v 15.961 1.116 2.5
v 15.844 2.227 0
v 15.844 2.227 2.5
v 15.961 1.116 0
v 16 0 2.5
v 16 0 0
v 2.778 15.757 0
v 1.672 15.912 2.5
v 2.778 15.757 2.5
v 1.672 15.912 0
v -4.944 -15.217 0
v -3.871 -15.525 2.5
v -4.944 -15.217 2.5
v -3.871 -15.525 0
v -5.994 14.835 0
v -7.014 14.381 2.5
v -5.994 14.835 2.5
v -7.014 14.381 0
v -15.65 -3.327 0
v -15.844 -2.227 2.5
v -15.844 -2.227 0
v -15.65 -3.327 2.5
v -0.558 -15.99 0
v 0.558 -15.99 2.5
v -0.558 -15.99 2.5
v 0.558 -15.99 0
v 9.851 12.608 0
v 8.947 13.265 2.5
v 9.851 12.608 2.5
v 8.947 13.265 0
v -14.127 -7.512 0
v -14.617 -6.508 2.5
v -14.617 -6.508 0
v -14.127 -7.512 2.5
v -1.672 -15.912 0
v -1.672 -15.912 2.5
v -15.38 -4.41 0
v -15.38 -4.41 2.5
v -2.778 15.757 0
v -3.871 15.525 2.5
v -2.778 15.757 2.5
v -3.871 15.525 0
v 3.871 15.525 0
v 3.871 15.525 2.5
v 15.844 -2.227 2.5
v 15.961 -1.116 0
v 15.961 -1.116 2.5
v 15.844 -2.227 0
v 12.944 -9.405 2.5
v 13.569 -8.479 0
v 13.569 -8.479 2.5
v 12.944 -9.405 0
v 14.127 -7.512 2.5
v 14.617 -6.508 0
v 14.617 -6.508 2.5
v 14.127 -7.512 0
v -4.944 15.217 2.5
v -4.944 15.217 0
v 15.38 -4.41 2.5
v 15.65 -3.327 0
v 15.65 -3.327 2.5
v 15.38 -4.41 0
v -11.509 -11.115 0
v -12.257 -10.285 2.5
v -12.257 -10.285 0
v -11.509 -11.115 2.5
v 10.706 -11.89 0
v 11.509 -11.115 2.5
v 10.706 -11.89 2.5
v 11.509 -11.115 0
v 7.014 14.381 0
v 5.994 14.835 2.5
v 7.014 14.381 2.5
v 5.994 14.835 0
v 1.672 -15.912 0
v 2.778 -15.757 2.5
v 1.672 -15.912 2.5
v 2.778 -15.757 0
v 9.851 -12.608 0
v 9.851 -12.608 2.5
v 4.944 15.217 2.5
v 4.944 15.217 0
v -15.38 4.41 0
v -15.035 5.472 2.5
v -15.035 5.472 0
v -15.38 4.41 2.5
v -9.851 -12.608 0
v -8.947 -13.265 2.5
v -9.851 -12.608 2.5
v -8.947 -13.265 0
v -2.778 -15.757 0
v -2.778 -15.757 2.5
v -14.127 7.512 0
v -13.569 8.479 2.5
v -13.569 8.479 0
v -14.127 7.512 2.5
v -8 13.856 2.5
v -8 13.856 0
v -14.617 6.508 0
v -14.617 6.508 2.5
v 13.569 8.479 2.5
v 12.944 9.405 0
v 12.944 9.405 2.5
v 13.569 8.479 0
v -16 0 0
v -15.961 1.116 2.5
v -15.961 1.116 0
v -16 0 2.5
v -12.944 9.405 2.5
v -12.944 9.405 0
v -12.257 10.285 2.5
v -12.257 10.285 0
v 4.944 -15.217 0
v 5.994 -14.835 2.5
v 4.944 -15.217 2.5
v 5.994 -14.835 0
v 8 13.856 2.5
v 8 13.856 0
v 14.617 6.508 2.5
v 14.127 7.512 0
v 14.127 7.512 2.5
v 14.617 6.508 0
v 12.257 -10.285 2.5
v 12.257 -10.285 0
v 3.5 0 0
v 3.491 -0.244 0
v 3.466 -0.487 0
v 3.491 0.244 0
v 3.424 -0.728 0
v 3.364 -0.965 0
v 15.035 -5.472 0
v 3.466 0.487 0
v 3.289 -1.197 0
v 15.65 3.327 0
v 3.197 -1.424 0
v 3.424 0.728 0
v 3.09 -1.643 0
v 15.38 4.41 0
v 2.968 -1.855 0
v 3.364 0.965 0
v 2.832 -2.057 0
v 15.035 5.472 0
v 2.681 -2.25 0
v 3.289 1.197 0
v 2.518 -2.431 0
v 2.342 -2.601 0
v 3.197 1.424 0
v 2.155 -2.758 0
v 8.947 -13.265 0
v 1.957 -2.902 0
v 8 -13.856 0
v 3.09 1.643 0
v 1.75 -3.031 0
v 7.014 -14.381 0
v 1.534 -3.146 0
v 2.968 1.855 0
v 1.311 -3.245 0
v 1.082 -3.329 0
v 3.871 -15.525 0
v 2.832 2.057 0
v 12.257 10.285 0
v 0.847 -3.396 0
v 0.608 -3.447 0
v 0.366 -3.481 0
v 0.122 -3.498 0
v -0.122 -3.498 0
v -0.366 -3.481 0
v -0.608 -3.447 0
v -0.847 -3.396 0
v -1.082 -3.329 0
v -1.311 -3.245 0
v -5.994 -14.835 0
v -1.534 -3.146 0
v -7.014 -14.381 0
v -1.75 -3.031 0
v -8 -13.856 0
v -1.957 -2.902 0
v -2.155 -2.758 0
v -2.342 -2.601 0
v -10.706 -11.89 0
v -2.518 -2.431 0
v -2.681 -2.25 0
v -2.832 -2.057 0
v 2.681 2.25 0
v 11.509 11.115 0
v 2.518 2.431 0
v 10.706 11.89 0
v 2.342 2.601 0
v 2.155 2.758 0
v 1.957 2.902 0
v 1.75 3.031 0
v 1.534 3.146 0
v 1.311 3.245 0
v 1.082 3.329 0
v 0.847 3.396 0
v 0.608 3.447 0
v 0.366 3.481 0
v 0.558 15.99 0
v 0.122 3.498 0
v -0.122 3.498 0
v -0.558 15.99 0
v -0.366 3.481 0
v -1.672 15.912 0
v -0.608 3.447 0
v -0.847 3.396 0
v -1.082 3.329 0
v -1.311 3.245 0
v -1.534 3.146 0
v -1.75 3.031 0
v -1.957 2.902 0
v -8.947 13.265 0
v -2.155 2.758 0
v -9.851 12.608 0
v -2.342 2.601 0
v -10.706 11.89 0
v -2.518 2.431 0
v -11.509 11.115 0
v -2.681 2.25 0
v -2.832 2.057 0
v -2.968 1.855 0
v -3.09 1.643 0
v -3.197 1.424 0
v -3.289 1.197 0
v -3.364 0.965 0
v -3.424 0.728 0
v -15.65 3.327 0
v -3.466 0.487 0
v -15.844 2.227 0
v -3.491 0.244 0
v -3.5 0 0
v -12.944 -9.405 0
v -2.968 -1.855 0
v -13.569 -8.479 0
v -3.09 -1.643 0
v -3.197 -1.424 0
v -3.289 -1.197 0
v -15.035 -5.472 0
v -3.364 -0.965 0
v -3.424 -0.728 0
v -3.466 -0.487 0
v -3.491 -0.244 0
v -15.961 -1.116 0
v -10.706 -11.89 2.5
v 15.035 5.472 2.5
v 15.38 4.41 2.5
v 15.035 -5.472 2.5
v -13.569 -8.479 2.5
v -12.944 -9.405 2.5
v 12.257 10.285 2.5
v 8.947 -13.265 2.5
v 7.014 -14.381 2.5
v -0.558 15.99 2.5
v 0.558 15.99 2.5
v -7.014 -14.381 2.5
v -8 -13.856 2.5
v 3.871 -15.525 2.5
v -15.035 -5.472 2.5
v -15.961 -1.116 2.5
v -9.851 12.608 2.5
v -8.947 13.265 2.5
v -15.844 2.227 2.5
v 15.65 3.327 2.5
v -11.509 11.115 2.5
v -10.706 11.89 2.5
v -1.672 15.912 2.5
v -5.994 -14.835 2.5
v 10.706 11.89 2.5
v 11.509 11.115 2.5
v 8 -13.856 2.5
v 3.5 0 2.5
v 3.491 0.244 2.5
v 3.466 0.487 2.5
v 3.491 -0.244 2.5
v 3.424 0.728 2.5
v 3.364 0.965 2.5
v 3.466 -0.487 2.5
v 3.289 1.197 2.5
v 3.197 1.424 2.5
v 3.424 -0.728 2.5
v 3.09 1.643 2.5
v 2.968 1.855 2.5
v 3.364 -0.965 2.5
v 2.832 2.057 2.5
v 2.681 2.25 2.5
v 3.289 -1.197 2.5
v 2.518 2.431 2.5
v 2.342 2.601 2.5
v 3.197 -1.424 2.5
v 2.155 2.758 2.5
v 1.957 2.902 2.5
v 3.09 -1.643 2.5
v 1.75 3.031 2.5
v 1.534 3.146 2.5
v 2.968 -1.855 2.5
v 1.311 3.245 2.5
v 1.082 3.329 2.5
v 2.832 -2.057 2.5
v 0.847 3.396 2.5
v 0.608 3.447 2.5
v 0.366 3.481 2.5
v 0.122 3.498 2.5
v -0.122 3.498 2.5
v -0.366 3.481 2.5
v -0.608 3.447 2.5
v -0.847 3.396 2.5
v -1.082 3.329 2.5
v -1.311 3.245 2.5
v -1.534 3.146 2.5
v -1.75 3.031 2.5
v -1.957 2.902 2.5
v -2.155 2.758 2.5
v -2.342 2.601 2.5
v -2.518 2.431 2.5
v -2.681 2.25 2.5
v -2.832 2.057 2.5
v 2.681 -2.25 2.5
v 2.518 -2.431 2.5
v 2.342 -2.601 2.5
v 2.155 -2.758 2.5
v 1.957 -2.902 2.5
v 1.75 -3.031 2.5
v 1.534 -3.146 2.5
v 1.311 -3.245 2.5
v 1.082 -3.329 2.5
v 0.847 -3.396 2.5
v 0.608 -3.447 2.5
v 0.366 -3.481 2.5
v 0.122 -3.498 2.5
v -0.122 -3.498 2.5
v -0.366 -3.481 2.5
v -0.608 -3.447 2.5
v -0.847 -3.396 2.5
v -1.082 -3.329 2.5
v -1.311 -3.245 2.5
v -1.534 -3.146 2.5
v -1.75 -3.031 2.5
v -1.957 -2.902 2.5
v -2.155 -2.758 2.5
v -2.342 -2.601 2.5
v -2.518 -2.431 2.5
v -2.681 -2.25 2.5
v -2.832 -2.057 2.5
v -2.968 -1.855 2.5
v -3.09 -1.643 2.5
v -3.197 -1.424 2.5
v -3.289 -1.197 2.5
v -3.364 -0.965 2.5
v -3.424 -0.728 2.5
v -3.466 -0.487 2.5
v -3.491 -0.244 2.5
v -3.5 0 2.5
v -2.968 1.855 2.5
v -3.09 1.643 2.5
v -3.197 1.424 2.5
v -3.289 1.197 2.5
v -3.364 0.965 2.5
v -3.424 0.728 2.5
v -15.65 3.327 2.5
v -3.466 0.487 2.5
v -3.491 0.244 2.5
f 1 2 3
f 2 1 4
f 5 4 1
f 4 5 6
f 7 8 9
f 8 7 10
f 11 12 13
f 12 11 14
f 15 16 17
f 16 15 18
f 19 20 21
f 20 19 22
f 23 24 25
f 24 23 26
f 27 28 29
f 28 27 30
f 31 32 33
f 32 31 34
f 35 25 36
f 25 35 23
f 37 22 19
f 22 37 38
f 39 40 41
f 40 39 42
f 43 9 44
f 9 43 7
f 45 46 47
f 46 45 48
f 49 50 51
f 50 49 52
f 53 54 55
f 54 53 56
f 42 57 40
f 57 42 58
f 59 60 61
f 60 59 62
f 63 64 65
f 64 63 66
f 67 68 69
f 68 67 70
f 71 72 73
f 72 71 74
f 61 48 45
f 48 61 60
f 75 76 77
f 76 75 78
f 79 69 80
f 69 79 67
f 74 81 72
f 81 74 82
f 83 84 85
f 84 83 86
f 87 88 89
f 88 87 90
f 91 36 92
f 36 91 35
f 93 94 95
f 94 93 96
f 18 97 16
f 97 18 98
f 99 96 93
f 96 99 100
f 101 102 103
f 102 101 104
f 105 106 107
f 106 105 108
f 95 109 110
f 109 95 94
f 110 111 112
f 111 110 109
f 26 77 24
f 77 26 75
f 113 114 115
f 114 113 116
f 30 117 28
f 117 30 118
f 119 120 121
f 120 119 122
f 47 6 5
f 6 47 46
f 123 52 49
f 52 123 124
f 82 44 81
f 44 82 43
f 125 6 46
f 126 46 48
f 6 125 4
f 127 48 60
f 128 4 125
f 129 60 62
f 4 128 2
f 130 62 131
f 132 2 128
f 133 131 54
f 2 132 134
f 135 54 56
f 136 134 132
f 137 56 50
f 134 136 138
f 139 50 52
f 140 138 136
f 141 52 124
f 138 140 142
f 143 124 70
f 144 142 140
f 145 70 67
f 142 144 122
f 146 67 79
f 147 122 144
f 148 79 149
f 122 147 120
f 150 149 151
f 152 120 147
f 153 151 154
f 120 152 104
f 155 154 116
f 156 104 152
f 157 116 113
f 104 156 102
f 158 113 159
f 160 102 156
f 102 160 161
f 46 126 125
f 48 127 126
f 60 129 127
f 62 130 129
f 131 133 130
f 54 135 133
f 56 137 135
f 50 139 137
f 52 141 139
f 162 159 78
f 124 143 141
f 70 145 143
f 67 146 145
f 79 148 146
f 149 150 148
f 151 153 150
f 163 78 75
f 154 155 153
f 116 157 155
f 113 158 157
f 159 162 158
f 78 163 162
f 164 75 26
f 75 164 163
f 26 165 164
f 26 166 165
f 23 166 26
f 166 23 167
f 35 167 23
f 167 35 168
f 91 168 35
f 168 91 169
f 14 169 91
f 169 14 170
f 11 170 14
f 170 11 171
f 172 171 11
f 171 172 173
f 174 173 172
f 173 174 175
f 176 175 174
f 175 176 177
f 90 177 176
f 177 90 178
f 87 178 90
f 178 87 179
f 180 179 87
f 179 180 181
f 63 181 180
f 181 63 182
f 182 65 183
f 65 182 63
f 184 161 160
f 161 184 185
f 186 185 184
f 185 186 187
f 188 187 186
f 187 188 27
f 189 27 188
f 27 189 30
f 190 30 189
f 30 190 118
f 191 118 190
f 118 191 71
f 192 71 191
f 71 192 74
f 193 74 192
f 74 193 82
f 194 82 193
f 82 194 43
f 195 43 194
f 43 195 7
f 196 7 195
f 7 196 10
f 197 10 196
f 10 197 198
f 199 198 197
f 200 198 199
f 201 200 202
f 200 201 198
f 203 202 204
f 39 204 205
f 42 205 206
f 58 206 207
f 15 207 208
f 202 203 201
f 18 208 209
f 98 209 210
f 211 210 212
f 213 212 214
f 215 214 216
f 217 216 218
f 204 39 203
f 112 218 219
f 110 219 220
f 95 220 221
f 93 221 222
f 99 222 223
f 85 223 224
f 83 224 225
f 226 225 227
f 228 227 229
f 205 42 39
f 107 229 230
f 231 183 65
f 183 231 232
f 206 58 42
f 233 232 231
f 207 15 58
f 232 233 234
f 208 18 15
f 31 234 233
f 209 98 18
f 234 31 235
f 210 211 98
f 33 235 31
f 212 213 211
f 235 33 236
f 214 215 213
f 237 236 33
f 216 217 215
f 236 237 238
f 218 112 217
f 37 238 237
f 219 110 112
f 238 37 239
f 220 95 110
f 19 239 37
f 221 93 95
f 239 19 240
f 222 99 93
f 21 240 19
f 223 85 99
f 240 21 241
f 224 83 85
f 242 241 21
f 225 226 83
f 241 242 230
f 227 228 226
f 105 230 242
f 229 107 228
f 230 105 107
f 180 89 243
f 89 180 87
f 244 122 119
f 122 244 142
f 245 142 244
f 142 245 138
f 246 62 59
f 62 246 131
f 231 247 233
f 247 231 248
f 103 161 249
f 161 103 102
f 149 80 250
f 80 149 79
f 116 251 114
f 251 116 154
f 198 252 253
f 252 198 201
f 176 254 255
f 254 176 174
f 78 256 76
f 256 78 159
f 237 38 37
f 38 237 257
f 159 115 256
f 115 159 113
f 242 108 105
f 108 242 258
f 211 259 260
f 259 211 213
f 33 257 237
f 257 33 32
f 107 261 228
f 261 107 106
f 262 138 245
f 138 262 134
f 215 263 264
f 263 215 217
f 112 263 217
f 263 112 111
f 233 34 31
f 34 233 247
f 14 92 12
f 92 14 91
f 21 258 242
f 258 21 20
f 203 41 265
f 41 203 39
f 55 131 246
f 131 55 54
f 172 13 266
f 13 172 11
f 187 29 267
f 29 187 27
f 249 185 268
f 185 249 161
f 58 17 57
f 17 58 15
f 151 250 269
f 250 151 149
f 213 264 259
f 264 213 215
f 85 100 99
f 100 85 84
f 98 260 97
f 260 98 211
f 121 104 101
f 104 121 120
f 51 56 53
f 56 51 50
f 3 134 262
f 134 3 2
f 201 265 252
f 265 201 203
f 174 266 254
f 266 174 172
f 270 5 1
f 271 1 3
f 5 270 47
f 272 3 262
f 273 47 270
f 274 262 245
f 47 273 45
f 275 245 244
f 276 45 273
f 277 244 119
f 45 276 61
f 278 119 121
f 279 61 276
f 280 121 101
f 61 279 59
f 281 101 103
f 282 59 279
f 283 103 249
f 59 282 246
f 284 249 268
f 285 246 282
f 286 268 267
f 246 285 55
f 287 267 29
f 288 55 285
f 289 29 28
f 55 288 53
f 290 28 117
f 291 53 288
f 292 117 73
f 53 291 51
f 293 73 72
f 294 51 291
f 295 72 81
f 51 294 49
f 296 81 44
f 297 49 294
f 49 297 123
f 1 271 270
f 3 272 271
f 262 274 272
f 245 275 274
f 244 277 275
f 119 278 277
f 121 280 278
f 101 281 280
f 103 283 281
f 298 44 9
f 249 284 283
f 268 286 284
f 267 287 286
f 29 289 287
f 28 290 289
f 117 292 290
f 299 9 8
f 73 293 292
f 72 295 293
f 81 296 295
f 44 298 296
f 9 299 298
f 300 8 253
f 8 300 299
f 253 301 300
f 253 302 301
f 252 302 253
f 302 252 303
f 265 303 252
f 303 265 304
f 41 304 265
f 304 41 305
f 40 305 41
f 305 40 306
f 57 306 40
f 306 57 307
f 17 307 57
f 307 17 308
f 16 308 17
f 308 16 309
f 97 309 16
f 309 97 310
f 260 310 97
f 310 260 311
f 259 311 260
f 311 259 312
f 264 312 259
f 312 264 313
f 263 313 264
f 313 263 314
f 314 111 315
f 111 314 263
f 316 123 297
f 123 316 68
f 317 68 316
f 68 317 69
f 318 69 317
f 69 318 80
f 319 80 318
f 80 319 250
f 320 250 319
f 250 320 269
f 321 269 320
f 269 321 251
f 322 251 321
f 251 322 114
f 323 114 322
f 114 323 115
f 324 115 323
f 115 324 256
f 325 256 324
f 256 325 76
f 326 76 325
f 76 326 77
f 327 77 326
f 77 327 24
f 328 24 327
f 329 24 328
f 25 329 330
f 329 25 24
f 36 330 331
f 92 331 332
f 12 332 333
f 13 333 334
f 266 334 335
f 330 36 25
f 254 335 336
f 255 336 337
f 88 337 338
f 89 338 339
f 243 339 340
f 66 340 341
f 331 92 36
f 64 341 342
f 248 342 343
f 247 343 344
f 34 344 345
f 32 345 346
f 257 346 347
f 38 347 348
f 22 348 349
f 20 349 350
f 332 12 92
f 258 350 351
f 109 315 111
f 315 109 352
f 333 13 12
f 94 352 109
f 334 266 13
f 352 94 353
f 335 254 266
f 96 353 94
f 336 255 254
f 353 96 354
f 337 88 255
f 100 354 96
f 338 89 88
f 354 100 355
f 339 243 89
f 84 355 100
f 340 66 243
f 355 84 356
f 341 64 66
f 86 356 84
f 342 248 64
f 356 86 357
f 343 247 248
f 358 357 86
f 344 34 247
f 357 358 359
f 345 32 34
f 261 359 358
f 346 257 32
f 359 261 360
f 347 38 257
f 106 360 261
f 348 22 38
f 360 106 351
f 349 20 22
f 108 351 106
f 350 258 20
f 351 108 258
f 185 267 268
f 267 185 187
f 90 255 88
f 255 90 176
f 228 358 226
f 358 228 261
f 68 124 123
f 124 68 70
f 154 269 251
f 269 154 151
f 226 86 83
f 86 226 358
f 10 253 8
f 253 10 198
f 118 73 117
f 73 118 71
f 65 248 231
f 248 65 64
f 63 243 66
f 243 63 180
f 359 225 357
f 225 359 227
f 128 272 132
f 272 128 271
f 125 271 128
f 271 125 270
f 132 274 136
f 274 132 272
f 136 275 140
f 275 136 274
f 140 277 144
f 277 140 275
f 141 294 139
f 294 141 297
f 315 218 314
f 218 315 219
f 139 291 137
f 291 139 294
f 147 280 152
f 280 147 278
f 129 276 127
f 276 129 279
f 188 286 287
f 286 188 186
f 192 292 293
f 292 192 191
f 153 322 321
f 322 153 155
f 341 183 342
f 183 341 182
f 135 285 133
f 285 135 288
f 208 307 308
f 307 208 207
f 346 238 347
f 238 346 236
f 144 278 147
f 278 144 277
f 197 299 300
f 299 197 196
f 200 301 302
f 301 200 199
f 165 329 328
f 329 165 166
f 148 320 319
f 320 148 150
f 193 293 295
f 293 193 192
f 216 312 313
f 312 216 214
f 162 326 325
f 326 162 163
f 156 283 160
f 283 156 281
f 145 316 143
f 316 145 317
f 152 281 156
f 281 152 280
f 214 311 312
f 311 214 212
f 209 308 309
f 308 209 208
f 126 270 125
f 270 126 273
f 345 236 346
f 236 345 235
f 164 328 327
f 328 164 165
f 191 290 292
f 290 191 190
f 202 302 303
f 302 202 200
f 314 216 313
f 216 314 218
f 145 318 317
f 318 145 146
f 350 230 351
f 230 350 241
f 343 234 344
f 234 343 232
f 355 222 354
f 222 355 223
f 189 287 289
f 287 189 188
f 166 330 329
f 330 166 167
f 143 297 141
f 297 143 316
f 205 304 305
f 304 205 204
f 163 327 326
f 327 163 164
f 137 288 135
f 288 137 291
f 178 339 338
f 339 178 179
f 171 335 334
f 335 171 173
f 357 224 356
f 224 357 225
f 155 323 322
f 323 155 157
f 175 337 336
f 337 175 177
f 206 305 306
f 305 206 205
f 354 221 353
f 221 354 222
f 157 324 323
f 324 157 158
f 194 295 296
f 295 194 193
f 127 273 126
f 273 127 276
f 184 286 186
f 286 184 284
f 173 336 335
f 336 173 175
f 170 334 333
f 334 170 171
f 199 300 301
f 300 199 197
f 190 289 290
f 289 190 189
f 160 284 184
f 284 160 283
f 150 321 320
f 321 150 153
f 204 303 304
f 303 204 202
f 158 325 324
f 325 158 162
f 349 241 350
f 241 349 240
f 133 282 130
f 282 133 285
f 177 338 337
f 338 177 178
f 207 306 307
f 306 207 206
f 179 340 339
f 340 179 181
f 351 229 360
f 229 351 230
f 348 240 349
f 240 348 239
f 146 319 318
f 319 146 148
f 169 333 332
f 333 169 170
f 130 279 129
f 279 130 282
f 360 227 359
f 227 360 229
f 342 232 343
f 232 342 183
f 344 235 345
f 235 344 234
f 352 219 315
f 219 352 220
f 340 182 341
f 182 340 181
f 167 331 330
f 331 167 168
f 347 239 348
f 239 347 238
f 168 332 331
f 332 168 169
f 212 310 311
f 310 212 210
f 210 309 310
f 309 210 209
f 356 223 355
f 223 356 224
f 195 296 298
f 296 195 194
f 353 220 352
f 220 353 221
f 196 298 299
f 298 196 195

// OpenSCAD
module quill(height, d_out, d_in) {
    difference() {
        cylinder($fn=90, h=height, r1=d_out/2, r2=d_out/2);
        translate([0, 0, -1]) {
            cylinder($fn=90, h=height+2, r1=d_in/2, r2=d_in/2);
        };
    };
};

quill(2.5, 32, 7);
